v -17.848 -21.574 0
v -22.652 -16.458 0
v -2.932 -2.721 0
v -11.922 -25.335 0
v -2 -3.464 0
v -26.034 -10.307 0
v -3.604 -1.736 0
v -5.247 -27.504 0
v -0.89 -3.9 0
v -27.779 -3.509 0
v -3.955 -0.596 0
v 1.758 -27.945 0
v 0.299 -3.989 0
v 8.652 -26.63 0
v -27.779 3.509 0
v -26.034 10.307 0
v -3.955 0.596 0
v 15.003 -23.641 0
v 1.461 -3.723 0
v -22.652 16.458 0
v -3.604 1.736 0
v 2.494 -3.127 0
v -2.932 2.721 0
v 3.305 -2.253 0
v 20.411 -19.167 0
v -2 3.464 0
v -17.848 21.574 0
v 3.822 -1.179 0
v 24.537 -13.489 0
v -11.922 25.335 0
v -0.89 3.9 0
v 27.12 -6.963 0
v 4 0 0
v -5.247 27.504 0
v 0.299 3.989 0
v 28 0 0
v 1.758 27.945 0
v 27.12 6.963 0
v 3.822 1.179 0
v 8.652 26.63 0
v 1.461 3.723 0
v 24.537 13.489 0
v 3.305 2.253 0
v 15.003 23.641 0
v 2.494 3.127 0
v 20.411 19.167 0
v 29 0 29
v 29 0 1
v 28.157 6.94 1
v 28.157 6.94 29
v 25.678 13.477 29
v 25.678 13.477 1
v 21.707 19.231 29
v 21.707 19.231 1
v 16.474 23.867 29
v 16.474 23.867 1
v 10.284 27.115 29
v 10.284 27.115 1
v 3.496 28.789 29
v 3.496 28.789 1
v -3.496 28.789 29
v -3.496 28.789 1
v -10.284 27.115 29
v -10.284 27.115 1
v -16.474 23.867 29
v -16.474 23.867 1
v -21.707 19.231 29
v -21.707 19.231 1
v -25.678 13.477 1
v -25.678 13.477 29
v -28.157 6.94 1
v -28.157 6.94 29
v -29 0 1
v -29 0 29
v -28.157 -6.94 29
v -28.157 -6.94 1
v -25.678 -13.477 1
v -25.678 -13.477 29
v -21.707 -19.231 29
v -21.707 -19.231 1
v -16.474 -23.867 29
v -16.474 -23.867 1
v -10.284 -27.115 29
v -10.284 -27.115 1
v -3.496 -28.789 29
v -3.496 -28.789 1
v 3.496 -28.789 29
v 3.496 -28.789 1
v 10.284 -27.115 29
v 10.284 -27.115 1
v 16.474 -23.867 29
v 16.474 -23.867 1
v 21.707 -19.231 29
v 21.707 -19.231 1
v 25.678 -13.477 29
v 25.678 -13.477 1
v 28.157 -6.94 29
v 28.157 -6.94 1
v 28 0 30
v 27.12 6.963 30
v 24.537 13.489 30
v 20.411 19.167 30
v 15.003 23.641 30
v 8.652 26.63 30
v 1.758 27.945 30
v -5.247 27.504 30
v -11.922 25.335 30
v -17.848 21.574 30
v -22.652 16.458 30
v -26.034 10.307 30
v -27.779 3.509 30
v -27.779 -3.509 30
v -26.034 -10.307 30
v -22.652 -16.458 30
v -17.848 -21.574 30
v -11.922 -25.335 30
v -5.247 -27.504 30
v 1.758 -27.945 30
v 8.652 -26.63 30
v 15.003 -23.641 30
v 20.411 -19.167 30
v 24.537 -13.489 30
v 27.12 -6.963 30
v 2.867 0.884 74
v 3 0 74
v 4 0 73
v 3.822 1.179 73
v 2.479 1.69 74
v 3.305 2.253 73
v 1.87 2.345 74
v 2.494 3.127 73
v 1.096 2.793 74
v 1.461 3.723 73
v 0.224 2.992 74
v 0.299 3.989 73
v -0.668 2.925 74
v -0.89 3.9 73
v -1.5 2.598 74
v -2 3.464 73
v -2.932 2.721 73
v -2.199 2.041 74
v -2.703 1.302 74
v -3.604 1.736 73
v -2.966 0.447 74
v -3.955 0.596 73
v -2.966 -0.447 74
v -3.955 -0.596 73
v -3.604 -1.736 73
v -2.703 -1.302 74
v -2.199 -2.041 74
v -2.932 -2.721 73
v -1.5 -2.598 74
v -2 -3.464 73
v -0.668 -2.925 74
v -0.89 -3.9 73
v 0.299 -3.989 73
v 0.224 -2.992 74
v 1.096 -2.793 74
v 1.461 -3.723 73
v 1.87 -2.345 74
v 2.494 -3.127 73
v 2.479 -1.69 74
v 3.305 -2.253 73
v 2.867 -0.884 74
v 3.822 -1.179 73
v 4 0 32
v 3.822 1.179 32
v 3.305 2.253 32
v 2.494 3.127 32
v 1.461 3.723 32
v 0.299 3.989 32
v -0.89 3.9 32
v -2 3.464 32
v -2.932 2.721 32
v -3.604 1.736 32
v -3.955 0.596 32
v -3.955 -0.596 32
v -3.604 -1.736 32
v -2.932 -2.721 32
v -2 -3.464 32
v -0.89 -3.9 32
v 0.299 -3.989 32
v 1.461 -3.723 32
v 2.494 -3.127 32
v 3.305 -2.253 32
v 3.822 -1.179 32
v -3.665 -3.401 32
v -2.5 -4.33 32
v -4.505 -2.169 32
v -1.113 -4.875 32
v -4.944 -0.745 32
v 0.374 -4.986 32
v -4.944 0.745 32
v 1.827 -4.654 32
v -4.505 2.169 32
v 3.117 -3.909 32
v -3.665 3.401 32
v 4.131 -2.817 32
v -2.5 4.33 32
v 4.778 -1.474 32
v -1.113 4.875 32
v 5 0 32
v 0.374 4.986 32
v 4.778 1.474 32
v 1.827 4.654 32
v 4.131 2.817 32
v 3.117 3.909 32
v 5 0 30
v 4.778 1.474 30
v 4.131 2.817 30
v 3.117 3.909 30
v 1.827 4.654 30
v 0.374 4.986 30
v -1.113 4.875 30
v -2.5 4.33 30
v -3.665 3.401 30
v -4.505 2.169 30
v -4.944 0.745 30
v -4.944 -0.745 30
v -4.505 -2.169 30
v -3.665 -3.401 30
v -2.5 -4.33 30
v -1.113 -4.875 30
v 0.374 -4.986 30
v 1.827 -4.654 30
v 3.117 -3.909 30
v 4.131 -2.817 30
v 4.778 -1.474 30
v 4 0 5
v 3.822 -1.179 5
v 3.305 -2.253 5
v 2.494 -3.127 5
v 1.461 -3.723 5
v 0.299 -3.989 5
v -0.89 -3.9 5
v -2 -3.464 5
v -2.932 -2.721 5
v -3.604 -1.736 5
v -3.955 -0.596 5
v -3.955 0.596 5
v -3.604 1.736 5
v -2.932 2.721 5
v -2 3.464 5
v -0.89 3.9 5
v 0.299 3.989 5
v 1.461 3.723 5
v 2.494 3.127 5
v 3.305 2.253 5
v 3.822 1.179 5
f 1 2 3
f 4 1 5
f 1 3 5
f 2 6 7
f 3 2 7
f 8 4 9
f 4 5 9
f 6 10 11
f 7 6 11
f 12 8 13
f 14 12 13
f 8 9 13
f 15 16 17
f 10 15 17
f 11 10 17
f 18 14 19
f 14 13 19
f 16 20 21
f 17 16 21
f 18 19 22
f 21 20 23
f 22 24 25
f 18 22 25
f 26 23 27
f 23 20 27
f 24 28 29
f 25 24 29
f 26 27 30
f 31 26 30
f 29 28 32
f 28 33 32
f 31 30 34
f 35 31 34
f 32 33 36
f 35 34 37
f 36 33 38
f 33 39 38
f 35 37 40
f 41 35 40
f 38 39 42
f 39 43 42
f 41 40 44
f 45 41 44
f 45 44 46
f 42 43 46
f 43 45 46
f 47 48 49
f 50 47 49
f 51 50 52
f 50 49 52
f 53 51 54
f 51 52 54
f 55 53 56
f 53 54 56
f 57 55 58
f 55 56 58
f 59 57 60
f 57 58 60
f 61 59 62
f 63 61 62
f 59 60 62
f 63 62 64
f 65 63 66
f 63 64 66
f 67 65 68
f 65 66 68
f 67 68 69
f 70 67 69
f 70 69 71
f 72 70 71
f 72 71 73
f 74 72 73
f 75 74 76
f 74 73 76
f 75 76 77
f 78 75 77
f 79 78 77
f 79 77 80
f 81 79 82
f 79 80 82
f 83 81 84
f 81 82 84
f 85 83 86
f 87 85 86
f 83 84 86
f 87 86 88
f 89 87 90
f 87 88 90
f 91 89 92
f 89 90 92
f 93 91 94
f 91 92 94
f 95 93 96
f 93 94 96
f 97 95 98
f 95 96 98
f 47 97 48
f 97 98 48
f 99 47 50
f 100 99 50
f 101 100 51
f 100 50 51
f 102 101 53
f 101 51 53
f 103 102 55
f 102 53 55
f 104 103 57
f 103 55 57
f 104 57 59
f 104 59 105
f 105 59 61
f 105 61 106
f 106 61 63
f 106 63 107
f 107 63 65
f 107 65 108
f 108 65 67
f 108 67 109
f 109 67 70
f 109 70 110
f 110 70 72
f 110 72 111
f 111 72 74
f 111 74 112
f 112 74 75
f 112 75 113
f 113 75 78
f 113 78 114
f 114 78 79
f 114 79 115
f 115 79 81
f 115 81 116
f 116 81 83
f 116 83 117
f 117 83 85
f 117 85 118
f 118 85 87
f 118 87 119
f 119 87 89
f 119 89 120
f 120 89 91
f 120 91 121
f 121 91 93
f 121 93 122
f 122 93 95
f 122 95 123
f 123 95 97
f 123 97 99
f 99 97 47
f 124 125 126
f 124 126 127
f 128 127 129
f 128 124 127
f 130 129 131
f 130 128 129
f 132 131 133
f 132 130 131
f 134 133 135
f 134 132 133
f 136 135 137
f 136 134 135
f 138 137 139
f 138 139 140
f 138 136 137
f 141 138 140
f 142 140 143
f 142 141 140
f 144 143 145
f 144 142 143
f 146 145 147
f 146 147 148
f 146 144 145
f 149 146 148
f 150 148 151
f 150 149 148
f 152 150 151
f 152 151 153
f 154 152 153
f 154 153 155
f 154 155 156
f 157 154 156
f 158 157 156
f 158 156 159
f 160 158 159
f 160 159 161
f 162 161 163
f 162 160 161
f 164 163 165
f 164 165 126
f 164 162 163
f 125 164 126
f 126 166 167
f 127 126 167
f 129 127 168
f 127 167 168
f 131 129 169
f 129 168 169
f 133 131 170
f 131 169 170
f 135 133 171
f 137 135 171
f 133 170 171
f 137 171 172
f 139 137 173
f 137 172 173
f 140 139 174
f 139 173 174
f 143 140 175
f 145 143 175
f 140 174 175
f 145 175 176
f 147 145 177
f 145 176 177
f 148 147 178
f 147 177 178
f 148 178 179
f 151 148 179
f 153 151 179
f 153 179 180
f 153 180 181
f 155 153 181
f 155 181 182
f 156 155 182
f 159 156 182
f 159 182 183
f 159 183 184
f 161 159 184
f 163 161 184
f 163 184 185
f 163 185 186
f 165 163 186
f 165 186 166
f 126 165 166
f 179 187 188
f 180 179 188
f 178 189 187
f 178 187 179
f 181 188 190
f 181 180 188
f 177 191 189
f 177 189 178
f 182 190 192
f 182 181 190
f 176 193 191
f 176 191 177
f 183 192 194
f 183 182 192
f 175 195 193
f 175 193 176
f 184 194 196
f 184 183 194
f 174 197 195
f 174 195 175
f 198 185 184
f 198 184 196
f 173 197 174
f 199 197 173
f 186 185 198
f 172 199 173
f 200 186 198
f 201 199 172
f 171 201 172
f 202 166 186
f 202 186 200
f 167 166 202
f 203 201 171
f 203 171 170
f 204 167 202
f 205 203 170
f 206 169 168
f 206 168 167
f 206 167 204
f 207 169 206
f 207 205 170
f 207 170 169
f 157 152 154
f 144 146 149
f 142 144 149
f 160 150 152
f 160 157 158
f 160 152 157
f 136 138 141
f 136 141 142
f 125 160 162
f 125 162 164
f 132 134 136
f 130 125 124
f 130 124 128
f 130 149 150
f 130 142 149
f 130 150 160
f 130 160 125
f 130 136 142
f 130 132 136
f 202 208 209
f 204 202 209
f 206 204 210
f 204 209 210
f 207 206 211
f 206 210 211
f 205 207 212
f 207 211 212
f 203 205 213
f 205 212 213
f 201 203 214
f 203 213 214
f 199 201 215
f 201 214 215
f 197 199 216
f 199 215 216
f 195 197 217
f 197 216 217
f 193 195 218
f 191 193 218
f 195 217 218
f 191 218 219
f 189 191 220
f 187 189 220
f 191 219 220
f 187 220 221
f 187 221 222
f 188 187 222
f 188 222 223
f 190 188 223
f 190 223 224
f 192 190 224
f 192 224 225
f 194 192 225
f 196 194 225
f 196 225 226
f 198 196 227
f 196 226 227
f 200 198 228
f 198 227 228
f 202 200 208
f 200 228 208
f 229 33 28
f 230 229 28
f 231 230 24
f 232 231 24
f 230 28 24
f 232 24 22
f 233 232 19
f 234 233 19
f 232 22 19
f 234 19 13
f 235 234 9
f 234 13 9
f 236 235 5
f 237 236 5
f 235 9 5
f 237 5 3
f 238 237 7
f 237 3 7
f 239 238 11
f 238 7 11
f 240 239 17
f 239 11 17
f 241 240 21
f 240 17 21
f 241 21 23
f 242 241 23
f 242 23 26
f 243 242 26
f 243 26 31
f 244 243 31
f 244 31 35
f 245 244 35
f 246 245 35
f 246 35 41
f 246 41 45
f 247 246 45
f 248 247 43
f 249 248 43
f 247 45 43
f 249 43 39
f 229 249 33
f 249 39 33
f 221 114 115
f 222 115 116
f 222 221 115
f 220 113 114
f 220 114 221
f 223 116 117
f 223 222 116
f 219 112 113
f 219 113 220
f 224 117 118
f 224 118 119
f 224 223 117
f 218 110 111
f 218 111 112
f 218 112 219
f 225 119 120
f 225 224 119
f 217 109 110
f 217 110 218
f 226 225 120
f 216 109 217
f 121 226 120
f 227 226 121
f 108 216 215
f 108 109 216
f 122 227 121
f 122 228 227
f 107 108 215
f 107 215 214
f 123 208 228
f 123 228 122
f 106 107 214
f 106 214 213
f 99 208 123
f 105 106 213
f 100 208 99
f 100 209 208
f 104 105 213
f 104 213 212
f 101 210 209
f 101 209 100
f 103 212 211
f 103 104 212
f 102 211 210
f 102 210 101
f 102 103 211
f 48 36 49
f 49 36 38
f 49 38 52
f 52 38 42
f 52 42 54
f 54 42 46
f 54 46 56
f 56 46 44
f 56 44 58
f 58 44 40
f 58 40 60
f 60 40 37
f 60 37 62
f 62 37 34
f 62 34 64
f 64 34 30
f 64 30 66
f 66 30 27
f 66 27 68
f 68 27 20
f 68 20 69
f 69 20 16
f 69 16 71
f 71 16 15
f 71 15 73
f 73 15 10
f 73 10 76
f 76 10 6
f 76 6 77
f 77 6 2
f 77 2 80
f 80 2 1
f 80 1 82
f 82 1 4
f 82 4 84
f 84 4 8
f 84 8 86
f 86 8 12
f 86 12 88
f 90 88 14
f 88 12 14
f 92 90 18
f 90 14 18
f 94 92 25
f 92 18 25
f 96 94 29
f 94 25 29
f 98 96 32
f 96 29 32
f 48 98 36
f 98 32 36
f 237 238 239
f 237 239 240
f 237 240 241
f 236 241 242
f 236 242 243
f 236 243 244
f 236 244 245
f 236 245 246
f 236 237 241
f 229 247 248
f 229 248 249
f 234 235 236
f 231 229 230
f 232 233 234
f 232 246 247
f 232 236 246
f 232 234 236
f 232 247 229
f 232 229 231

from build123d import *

# Parameters (mm, degrees)
ESQUISSE1_R             = 29
BOSS_EXTRU_1_DEPTH      = 30
ESQUISSE2_R             = 4
BOSS_EXTRU_2_DEPTH      = 6
ESQUISSE3_R             = 5
BOSS_EXTRU_3_DEPTH      = 2
ESQUISSE4_R             = 4
ENL_V_MAT_EXTRU_1_DEPTH = 5
CHANFREIN1_SIZE         = 1
ESQUISSE5_R             = 4
BOSS_EXTRU_4_DEPTH      = 10
ESQUISSE6_R             = 4
BOSS_EXTRU_5_DEPTH      = 28
CHANFREIN2_SIZE         = 1


with BuildPart() as part:
    # Esquisse1 → Boss.-Extru.1 (new body)
    with BuildSketch(Plane.XY):
        Circle(ESQUISSE1_R)
    extrude(amount=BOSS_EXTRU_1_DEPTH)

    # Esquisse2 → Boss.-Extru.2 (add)
    with BuildSketch(Plane.XY.offset(30)):
        Circle(ESQUISSE2_R)
    extrude(amount=BOSS_EXTRU_2_DEPTH)

    # Esquisse3 → Boss.-Extru.3 (add)
    with BuildSketch(Plane.XY.offset(30)):
        Circle(ESQUISSE3_R)
    extrude(amount=BOSS_EXTRU_3_DEPTH)

    # Esquisse4 → Enlèv. mat.-Extru.1 (cut)
    with BuildSketch(Plane(origin=(0, 0, 0), x_dir=(-1, 0, 0), z_dir=(0, 0, -1))):
        with Locations(Location((0, 0, 0), (0, 0, 180))):
            Circle(ESQUISSE4_R)
    extrude(amount=-ENL_V_MAT_EXTRU_1_DEPTH, mode=Mode.SUBTRACT)

    # Chanfrein1
    chanfrein1_edges = [part.edges().sort_by_distance(p)[0] for p in [
        (-29, 0, 0),
        (-29, 0, 30),
    ]]
    chamfer(chanfrein1_edges, length=CHANFREIN1_SIZE)

    # Esquisse5 → Boss.-Extru.4 (add)
    with BuildSketch(Plane.XY.offset(36)):
        Circle(ESQUISSE5_R)
    extrude(amount=BOSS_EXTRU_4_DEPTH)

    # Esquisse6 → Boss.-Extru.5 (add)
    with BuildSketch(Plane.XY.offset(46)):
        Circle(ESQUISSE6_R)
    extrude(amount=BOSS_EXTRU_5_DEPTH)

    # Chanfrein2
    chanfrein2_edges = [part.edges().sort_by_distance(p)[0] for p in [
        (-4, 0, 74),
    ]]
    chamfer(chanfrein2_edges, length=CHANFREIN2_SIZE)


solid = part.part
